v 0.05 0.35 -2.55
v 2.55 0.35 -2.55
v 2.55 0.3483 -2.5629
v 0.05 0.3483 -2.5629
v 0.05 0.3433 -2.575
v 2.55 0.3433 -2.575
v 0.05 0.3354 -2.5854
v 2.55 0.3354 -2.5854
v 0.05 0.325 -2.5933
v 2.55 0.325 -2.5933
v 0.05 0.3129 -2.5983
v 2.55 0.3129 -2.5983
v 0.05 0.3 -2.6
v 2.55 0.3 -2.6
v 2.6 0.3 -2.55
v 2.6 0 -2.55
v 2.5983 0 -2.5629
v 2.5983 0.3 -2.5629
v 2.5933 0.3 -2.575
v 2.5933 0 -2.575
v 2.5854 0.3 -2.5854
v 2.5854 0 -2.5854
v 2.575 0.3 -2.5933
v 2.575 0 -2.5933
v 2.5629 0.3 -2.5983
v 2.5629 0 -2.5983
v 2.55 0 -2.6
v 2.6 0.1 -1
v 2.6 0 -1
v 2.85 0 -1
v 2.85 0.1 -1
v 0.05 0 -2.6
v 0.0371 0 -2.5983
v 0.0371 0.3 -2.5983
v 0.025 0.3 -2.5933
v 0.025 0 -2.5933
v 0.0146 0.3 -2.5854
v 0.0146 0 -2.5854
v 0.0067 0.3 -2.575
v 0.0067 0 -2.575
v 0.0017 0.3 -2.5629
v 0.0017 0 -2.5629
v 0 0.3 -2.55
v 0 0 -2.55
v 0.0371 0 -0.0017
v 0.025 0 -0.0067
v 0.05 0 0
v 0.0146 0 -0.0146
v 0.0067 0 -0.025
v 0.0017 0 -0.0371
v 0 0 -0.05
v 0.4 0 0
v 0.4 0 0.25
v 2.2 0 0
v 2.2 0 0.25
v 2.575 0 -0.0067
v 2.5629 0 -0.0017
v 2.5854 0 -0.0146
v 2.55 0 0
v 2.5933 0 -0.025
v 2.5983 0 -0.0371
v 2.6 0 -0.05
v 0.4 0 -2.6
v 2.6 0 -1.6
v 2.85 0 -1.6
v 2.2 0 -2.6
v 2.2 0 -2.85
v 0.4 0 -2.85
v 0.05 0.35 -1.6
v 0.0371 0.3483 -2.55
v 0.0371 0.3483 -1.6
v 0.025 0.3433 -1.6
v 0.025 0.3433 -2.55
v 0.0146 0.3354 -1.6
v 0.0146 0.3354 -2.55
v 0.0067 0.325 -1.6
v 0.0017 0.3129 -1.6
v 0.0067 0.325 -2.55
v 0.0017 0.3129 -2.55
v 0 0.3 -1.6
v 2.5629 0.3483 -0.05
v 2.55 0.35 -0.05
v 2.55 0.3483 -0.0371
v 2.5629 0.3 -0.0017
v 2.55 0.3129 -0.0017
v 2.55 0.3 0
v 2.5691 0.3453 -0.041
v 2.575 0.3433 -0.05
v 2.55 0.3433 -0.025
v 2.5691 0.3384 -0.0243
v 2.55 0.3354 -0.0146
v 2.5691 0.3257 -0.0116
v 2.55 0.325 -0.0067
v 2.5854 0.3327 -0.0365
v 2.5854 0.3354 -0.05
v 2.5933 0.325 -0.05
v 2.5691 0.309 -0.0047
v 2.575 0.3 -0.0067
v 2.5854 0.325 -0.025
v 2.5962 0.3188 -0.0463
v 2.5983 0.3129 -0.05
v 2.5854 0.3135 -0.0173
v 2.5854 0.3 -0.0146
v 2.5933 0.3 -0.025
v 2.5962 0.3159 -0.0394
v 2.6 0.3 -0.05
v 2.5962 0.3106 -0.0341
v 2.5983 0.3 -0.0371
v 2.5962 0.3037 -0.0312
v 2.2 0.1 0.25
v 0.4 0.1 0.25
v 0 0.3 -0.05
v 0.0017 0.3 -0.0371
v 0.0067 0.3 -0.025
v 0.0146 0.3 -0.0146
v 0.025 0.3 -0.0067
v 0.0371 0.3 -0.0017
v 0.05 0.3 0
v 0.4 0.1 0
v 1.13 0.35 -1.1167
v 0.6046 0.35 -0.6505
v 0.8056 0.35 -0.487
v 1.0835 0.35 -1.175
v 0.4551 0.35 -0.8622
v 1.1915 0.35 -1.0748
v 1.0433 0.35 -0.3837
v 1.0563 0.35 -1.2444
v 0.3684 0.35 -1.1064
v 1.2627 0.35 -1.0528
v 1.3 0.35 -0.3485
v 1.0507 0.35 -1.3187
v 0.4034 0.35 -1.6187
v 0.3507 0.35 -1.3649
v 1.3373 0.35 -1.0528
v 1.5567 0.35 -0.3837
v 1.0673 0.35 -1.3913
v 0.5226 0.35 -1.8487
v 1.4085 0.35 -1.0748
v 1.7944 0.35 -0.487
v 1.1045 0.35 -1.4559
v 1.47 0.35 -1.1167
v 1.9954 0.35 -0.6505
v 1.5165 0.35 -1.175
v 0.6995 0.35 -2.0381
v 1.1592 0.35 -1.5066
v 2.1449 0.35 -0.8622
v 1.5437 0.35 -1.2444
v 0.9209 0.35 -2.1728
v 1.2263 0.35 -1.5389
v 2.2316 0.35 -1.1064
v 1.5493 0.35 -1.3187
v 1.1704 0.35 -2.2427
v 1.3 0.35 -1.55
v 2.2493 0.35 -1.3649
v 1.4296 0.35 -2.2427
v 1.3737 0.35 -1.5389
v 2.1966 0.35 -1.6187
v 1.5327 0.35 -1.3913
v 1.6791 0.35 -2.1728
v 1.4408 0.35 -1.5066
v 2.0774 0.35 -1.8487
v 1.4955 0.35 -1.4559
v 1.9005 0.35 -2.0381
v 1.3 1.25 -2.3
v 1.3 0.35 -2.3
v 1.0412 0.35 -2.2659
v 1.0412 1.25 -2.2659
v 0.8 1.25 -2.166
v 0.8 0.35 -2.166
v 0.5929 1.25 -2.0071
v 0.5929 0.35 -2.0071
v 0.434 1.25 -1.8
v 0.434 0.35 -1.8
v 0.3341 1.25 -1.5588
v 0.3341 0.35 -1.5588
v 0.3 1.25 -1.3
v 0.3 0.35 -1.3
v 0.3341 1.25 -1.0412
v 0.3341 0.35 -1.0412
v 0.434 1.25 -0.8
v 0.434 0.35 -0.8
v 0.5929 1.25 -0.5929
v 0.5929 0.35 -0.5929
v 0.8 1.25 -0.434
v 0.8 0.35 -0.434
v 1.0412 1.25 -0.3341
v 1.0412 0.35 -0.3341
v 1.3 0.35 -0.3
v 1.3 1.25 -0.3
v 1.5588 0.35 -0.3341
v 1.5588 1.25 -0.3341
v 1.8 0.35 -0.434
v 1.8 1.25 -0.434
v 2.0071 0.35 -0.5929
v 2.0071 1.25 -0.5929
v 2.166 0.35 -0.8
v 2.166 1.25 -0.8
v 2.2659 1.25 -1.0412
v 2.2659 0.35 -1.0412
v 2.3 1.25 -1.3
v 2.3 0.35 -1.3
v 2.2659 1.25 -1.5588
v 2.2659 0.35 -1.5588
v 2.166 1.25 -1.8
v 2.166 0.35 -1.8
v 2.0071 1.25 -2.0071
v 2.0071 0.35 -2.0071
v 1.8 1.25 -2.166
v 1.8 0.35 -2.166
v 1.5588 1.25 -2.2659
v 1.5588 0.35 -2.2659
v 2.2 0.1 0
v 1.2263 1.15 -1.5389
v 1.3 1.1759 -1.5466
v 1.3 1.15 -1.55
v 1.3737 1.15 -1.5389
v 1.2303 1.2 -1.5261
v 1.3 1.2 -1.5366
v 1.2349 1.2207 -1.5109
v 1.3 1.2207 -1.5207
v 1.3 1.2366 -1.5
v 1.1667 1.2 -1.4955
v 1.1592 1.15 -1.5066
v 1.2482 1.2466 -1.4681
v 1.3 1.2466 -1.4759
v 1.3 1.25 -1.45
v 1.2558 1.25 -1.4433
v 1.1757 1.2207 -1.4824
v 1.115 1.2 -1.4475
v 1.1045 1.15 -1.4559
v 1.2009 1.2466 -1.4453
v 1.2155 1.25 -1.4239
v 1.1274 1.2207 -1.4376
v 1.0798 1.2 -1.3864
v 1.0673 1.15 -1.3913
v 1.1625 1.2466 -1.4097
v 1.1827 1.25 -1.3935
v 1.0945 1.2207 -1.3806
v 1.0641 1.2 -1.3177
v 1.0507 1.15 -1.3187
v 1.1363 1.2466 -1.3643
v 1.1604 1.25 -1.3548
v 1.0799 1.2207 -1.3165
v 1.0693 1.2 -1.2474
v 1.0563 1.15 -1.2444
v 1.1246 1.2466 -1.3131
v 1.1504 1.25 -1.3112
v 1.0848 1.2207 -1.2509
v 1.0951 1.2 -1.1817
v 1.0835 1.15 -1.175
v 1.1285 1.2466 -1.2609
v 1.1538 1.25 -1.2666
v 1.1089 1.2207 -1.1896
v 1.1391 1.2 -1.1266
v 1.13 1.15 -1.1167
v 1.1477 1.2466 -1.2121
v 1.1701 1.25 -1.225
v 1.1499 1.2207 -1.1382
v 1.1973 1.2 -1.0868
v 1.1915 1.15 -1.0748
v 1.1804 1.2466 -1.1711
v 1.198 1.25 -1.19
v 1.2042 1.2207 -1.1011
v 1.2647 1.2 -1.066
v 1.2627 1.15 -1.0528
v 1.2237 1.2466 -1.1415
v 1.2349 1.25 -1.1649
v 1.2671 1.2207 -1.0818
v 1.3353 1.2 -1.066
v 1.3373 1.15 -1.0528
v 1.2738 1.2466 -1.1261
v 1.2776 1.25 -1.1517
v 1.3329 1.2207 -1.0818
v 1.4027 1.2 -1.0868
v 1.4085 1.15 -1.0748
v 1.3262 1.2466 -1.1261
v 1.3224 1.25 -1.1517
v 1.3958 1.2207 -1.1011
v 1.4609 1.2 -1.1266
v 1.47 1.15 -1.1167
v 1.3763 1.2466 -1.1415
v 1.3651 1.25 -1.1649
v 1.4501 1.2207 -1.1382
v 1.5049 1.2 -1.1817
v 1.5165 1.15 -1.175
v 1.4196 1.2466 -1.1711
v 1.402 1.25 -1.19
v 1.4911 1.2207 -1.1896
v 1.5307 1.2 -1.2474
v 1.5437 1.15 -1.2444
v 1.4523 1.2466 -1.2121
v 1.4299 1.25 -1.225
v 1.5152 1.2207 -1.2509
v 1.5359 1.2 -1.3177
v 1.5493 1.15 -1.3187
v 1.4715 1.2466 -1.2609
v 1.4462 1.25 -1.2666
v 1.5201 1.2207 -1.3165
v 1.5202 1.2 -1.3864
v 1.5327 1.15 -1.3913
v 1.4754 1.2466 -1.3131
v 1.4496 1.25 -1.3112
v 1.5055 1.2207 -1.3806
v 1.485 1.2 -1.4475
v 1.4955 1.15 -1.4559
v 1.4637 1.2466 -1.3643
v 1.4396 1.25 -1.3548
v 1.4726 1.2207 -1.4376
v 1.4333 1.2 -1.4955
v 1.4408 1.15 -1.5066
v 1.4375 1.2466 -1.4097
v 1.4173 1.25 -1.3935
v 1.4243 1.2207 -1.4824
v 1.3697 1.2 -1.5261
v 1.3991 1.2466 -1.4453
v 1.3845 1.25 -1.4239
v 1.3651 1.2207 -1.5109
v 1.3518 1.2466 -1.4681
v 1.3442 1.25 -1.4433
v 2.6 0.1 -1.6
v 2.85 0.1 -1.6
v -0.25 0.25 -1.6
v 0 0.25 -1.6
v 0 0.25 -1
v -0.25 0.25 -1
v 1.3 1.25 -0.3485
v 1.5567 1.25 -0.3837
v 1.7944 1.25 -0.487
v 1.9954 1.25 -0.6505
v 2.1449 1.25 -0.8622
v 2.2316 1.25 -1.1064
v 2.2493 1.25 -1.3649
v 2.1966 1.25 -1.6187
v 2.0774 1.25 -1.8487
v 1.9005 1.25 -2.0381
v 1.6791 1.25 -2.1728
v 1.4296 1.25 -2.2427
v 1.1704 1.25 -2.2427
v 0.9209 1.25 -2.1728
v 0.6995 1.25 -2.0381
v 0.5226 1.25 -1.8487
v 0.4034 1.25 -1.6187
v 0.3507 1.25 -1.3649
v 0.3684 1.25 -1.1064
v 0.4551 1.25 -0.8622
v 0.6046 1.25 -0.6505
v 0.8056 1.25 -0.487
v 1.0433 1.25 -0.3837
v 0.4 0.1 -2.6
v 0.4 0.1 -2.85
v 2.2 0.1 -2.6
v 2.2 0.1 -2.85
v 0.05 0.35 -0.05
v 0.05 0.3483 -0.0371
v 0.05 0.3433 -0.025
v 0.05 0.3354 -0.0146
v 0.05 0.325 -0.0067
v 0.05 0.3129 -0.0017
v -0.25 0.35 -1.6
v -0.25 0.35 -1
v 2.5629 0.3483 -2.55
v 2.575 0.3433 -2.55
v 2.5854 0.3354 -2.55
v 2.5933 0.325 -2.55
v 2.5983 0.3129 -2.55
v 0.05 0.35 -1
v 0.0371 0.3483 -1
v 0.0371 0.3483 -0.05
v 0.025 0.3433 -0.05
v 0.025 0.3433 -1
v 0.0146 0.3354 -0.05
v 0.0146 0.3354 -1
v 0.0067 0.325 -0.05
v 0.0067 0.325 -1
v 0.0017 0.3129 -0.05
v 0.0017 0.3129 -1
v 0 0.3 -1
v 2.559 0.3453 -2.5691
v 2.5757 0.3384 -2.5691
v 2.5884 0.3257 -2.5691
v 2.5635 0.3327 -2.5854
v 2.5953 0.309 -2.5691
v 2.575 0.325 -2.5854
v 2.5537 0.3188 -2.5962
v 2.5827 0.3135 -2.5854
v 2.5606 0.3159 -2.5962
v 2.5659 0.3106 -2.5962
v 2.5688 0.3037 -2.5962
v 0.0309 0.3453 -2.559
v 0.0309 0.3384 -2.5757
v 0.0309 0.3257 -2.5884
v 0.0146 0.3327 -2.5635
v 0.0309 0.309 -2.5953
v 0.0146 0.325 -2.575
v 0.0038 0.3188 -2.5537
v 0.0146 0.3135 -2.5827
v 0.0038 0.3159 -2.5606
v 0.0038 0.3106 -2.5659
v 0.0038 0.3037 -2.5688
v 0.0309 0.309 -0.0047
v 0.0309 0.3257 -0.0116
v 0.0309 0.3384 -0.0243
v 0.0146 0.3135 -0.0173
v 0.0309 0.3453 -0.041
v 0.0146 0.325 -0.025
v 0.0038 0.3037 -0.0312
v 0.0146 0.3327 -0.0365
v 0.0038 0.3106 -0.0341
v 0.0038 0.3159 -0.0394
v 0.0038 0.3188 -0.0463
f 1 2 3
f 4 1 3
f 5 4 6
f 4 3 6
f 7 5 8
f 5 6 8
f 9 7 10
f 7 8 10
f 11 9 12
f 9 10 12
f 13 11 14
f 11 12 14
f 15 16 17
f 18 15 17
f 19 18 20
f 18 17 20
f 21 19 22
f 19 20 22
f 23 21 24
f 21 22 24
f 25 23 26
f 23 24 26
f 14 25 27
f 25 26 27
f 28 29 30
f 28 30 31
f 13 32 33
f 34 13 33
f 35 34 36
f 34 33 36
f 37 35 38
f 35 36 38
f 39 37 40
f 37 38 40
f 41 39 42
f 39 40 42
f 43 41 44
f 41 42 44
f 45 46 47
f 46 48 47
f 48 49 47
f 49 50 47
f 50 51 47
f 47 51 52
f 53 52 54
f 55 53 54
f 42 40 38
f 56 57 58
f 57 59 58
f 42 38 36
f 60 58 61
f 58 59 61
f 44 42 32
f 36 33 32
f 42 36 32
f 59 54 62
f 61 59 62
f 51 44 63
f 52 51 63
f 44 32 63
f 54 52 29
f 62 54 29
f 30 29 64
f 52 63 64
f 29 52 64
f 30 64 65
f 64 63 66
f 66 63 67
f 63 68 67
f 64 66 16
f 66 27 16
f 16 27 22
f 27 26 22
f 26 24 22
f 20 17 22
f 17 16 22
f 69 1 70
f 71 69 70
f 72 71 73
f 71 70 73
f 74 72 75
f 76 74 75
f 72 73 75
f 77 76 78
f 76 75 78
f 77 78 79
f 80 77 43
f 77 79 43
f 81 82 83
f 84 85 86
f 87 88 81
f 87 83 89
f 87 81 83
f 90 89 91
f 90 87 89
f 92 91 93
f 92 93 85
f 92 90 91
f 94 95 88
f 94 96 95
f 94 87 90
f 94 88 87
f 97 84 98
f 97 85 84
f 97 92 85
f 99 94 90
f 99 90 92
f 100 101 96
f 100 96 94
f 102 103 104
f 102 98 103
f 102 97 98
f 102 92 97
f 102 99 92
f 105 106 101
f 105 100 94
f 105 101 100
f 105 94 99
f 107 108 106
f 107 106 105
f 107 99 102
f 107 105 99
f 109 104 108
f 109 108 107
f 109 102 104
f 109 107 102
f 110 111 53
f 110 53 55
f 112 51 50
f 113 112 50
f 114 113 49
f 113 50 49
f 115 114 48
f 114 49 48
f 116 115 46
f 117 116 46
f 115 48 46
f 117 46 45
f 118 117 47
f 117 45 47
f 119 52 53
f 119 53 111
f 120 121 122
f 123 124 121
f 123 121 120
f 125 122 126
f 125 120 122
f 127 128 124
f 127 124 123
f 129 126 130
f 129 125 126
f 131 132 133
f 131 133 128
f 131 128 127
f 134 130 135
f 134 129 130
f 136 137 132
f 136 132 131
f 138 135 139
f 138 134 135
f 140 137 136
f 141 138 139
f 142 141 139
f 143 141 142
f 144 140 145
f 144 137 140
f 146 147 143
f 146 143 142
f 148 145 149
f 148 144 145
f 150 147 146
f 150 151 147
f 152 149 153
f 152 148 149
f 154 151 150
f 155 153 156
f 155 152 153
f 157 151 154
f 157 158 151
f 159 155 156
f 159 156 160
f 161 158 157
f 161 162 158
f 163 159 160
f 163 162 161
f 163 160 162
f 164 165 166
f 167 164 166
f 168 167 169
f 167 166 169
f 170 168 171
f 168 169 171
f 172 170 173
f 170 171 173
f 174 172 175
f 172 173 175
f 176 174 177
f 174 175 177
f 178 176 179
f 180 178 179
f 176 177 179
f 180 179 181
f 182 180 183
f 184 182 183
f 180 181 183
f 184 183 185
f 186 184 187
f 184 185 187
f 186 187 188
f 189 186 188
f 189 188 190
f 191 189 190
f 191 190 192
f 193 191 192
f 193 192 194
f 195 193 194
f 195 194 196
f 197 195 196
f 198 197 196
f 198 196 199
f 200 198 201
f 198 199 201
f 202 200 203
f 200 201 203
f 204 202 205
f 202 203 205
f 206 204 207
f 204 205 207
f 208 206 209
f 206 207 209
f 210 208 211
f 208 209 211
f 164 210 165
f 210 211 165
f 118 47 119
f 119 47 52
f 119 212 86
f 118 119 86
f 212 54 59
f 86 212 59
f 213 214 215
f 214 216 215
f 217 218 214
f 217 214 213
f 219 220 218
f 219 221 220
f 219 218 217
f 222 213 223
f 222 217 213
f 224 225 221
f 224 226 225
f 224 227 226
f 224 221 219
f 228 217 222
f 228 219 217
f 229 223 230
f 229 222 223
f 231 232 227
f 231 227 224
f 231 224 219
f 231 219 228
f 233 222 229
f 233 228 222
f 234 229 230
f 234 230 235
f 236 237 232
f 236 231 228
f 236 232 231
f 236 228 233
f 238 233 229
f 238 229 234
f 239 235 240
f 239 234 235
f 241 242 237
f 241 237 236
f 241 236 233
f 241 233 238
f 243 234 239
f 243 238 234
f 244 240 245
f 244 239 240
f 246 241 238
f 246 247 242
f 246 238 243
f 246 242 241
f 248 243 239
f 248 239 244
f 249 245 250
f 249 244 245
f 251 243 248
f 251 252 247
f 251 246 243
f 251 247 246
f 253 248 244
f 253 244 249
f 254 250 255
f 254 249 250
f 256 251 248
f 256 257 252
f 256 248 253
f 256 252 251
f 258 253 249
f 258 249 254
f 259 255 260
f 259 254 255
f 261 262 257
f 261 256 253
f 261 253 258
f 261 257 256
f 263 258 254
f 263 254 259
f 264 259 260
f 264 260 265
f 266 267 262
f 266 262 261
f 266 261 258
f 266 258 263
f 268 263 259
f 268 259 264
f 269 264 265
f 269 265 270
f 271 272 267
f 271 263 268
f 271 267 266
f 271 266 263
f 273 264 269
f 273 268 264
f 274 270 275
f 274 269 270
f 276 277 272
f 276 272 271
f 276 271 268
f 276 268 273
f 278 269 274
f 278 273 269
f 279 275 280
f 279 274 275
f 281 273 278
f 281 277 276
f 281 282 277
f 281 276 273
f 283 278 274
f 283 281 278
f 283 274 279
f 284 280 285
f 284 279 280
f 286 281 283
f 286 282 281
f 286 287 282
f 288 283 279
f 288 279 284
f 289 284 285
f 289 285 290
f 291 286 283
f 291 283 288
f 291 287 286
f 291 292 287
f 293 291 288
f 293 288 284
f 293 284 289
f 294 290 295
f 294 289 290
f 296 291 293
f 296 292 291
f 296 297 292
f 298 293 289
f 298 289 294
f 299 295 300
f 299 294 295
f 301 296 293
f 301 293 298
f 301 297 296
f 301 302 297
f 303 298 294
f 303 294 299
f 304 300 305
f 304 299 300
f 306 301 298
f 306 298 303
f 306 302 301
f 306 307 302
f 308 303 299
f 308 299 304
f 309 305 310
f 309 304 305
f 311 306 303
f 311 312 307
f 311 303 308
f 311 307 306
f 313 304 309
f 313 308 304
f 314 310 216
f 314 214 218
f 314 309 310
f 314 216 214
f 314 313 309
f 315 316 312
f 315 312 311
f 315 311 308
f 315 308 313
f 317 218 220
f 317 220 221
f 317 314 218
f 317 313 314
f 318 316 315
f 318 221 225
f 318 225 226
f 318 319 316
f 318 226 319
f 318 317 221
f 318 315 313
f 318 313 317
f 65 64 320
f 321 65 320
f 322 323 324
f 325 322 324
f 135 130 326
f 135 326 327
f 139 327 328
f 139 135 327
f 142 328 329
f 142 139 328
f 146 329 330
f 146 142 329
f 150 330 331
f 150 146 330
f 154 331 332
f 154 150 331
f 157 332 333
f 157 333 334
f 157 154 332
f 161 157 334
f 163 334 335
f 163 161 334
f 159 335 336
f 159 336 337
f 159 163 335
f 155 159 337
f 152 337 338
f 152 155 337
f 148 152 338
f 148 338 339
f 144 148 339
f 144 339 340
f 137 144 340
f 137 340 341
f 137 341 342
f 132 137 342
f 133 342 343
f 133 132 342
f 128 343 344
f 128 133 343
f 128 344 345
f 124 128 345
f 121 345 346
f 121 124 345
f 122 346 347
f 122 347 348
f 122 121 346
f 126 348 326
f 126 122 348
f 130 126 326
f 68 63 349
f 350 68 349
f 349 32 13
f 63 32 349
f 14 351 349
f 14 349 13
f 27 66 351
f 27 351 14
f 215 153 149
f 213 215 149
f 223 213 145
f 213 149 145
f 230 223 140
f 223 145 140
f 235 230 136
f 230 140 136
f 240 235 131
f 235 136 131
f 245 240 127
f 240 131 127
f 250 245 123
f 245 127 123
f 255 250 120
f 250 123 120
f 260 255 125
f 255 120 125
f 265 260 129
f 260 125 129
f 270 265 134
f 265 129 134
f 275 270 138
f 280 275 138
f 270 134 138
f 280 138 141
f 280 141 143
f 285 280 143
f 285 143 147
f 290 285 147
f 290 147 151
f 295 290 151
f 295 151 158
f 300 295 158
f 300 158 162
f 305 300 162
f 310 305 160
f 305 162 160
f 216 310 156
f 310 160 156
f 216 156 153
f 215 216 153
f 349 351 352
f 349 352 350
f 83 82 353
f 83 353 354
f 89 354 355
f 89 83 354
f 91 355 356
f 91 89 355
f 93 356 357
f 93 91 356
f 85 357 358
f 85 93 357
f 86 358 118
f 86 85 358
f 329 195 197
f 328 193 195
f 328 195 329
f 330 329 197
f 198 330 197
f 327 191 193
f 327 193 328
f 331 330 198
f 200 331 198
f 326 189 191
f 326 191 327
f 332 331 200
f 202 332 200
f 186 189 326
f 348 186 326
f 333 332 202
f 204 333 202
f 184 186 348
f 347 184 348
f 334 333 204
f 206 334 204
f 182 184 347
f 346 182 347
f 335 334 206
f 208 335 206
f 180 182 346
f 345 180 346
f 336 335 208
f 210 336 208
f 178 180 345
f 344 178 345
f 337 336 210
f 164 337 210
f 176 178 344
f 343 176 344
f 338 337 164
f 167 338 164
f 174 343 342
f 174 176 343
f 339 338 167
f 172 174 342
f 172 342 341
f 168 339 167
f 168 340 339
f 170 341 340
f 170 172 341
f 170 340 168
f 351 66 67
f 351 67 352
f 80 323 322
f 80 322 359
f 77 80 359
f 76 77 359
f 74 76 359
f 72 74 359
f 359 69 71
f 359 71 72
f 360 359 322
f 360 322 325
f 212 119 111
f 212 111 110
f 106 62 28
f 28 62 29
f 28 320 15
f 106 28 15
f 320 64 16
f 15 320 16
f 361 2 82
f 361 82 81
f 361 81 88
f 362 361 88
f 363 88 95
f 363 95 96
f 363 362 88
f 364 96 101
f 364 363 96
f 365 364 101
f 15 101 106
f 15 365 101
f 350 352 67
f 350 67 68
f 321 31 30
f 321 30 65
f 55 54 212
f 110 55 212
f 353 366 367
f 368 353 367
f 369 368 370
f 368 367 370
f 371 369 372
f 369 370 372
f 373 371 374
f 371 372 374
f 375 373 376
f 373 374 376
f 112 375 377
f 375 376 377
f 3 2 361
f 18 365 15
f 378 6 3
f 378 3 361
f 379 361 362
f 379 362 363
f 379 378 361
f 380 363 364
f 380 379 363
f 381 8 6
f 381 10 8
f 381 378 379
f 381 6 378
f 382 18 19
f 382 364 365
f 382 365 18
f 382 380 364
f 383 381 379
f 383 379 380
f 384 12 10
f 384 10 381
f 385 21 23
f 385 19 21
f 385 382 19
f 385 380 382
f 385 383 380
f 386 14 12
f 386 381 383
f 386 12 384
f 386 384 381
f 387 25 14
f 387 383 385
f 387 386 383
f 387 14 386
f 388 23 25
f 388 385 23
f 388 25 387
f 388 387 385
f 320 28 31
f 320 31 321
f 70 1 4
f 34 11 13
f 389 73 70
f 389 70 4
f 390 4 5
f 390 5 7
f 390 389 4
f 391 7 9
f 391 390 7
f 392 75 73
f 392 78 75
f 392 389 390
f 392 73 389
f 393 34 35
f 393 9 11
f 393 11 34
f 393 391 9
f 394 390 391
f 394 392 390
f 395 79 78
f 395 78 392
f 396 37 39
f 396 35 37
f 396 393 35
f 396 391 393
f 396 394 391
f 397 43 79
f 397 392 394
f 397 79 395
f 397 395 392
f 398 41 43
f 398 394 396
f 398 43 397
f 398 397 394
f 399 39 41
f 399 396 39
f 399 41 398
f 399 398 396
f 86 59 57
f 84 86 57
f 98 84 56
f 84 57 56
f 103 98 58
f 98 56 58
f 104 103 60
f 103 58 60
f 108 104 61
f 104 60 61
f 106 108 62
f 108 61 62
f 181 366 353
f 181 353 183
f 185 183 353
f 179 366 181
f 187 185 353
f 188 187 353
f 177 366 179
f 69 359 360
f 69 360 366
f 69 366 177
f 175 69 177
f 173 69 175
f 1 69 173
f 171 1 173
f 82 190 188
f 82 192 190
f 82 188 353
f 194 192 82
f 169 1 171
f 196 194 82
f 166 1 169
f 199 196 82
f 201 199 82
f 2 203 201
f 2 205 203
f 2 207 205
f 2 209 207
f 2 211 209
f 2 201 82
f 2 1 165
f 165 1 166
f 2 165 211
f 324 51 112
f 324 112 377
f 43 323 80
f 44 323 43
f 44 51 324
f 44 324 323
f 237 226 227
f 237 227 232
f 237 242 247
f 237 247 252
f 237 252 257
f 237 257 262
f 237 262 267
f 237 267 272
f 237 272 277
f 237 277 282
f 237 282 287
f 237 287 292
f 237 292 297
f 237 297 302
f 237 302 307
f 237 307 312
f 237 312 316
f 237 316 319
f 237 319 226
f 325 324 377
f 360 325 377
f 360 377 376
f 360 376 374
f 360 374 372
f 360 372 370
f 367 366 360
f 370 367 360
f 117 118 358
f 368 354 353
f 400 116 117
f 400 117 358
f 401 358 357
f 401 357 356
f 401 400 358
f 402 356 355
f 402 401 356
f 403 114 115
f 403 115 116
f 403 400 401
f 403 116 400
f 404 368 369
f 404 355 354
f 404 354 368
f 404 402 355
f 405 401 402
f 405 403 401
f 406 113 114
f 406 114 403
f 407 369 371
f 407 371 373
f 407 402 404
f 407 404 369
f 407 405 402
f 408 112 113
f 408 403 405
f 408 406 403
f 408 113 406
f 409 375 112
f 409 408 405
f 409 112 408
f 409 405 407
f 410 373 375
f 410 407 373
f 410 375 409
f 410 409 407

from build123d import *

# Parameters (mm, degrees)
SKETCH_1_W      = 2.6
SKETCH_1_H      = 2.6
EXTRUDE_1_DEPTH = 0.35
SKETCH_2_R      = 1
SKETCH_2_R_2    = 0.951541019
SKETCH_2_R_3    = 0.25
EXTRUDE_2_DEPTH = 0.9
SKETCH_3_W      = 0.6
SKETCH_3_H      = 0.1
EXTRUDE_3_DEPTH = 0.25
SKETCH_4_W      = 1.8
SKETCH_4_H      = 0.1
EXTRUDE_4_DEPTH = 0.25
SKETCH_5_W      = 1.8
SKETCH_5_H      = 0.1
EXTRUDE_5_DEPTH = 0.25
SKETCH_6_W      = 0.6
SKETCH_6_H      = 0.1
EXTRUDE_6_DEPTH = 0.25
FILLET_1_R      = 0.1
FILLET_2_R      = 0.05
FILLET_3_R      = 0.05


with BuildPart() as part:
    # 草图1 → 凸台-拉伸1 (new body)
    with BuildSketch(Plane(origin=(0, 0, 0), x_dir=(1, 0, 0), z_dir=(0, 1, 0))):
        with Locations((1.3, 1.3)):
            Rectangle(SKETCH_1_W, SKETCH_1_H)
    extrude(amount=EXTRUDE_1_DEPTH)

    # 草图2 → 凸台-拉伸2 (add)
    # profile 1 of 2: a face of its own
    with BuildSketch(Plane(origin=(0, 0.35, 0), x_dir=(1, 0, 0), z_dir=(0, 1, 0))):
        with Locations(Location((1.3, 1.3, 0), (0, 0, 90))):
            Circle(SKETCH_2_R)
        with Locations(Location((1.3, 1.3, 0), (0, 0, 270))):
            Circle(SKETCH_2_R_2, mode=Mode.SUBTRACT)
    # profile 2 of 2: a face of its own
    with BuildSketch(Plane(origin=(0, 0.35, 0), x_dir=(1, 0, 0), z_dir=(0, 1, 0))):
        with Locations(Location((1.3, 1.3, 0), (0, 0, 90))):
            Circle(SKETCH_2_R_3)
    extrude(amount=EXTRUDE_2_DEPTH)

    # 草图3 → 凸台-拉伸3 (add)
    with BuildSketch(Plane(origin=(2.6, 0, 0), x_dir=(0, 0, -1), z_dir=(1, 0, 0))):
        with Locations((1.3, 0.05)):
            Rectangle(SKETCH_3_W, SKETCH_3_H)
    extrude(amount=EXTRUDE_3_DEPTH)

    # 草图4 → 凸台-拉伸4 (add)
    with BuildSketch(Plane.XY):
        with Locations((1.3, 0.05)):
            Rectangle(SKETCH_4_W, SKETCH_4_H)
    extrude(amount=EXTRUDE_4_DEPTH)

    # 草图5 → 凸台-拉伸5 (add)
    with BuildSketch(Plane(origin=(0, 0, -2.6), x_dir=(-1, 0, 0), z_dir=(0, 0, -1))):
        with Locations((-1.3, 0.05)):
            Rectangle(SKETCH_5_W, SKETCH_5_H)
    extrude(amount=EXTRUDE_5_DEPTH)

    # 草图6 → 凸台-拉伸6 (add)
    with BuildSketch(Plane.ZY):
        with Locations((-1.3, 0.3)):
            Rectangle(SKETCH_6_W, SKETCH_6_H)
    extrude(amount=EXTRUDE_6_DEPTH)

    # 圆角1
    fillet_1_edges = [part.edges().sort_by_distance(p)[0] for p in [
        (1.3, 1.25, -1.05),
    ]]
    fillet(fillet_1_edges, radius=FILLET_1_R)

    # 圆角2
    fillet_2_edges = [part.edges().sort_by_distance(p)[0] for p in [
        (2.6, 0.35, -1.3),
        (1.3, 0.35, -2.6),
        (0, 0.35, -2.1),
        (0, 0.35, -0.5),
        (1.3, 0.35, 0),
    ]]
    fillet(fillet_2_edges, radius=FILLET_2_R)

    # 圆角3
    # the kernel refuses this fillet: 0.05 mm, written as the material it takes off along each edge
    with BuildSketch(Plane(origin=(0.05, 0.3, -2.55), x_dir=(0, 0, -1), z_dir=(-1, 0, 0))) as fillet_3_piece_1_section:
        Polygon((0, 0), (FILLET_3_R, 0), (FILLET_3_R, -FILLET_3_R), (0, -FILLET_3_R), align=None)
    fillet_3_piece_1 = extrude(amount=FILLET_3_R, mode=Mode.PRIVATE)
    fillet_3_piece_1 = fillet_3_piece_1 - Plane(origin=(0.05, 0.3, -2.55), x_dir=(0, -0.7071067811865475, 0.7071067811865475), z_dir=(-1, 0, 0)) * Sphere(FILLET_3_R, mode=Mode.PRIVATE)
    add(fillet_3_piece_1, mode=Mode.SUBTRACT)
    with BuildSketch(Plane(origin=(0.05, 0.3, -0.05), x_dir=(0, 0, 1), z_dir=(-1, 0, 0))) as fillet_3_piece_2_section:
        Polygon((0, 0), (FILLET_3_R, 0), (FILLET_3_R, FILLET_3_R), (0, FILLET_3_R), align=None)
    fillet_3_piece_2 = extrude(amount=FILLET_3_R, mode=Mode.PRIVATE)
    fillet_3_piece_2 = fillet_3_piece_2 - Plane(origin=(0.05, 0.3, -0.05), x_dir=(0, -0.7071067811865475, -0.7071067811865475), z_dir=(-1, 0, 0)) * Sphere(FILLET_3_R, mode=Mode.PRIVATE)
    add(fillet_3_piece_2, mode=Mode.SUBTRACT)
    with BuildSketch(Plane(origin=(2.55, 0.3, -0.05), x_dir=(0, 0, 1), z_dir=(1, 0, 0))) as fillet_3_piece_3_section:
        Polygon((0, 0), (FILLET_3_R, 0), (FILLET_3_R, -FILLET_3_R), (0, -FILLET_3_R), align=None)
    fillet_3_piece_3 = extrude(amount=FILLET_3_R, mode=Mode.PRIVATE)
    fillet_3_piece_3 = fillet_3_piece_3 - Plane(origin=(2.55, 0.3, -0.05), x_dir=(0, -0.7071067811865475, -0.7071067811865475), z_dir=(1, 0, 0)) * Sphere(FILLET_3_R, mode=Mode.PRIVATE)
    add(fillet_3_piece_3, mode=Mode.SUBTRACT)
    with BuildSketch(Plane(origin=(2.55, 0.3, -2.55), x_dir=(1, 0, 0), z_dir=(0, 0, -1))) as fillet_3_piece_4_section:
        Polygon((0, 0), (FILLET_3_R, 0), (FILLET_3_R, -FILLET_3_R), (0, -FILLET_3_R), align=None)
    fillet_3_piece_4 = extrude(amount=FILLET_3_R, mode=Mode.PRIVATE)
    fillet_3_piece_4 = fillet_3_piece_4 - Plane(origin=(2.55, 0.3, -2.55), x_dir=(-0.7071067811865475, -0.7071067811865475, 0), z_dir=(0, 0, -1)) * Sphere(FILLET_3_R, mode=Mode.PRIVATE)
    add(fillet_3_piece_4, mode=Mode.SUBTRACT)
    with BuildSketch(Plane(origin=(0, -0.125, -2.6), x_dir=(0, 0, 1), z_dir=(0, 1, 0)), Plane(origin=(2.6, -0.125, 0), x_dir=(0, 0, -1), z_dir=(0, 1, 0)), Plane(origin=(2.6, -0.125, -2.6), x_dir=(-1, 0, 0), z_dir=(0, 1, 0))) as fillet_3_piece_5:
        with BuildLine():
            CenterArc((FILLET_3_R, FILLET_3_R), FILLET_3_R, 180, 90)
            Line((0, FILLET_3_R), (0, 0))
            Line((0, 0), (FILLET_3_R, 0))
        make_face()
    extrude(amount=0.425, mode=Mode.SUBTRACT)
    with BuildSketch(Plane(origin=(0, -0.125, 0), x_dir=(0, 0, -1), z_dir=(0, 1, 0))) as fillet_3_piece_6:
        with BuildLine():
            CenterArc((FILLET_3_R, -FILLET_3_R), FILLET_3_R, 90, 90)
            Line((0, -FILLET_3_R), (0, 0))
            Line((0, 0), (FILLET_3_R, 0))
        make_face()
    extrude(amount=0.425, mode=Mode.SUBTRACT)


solid = part.part
